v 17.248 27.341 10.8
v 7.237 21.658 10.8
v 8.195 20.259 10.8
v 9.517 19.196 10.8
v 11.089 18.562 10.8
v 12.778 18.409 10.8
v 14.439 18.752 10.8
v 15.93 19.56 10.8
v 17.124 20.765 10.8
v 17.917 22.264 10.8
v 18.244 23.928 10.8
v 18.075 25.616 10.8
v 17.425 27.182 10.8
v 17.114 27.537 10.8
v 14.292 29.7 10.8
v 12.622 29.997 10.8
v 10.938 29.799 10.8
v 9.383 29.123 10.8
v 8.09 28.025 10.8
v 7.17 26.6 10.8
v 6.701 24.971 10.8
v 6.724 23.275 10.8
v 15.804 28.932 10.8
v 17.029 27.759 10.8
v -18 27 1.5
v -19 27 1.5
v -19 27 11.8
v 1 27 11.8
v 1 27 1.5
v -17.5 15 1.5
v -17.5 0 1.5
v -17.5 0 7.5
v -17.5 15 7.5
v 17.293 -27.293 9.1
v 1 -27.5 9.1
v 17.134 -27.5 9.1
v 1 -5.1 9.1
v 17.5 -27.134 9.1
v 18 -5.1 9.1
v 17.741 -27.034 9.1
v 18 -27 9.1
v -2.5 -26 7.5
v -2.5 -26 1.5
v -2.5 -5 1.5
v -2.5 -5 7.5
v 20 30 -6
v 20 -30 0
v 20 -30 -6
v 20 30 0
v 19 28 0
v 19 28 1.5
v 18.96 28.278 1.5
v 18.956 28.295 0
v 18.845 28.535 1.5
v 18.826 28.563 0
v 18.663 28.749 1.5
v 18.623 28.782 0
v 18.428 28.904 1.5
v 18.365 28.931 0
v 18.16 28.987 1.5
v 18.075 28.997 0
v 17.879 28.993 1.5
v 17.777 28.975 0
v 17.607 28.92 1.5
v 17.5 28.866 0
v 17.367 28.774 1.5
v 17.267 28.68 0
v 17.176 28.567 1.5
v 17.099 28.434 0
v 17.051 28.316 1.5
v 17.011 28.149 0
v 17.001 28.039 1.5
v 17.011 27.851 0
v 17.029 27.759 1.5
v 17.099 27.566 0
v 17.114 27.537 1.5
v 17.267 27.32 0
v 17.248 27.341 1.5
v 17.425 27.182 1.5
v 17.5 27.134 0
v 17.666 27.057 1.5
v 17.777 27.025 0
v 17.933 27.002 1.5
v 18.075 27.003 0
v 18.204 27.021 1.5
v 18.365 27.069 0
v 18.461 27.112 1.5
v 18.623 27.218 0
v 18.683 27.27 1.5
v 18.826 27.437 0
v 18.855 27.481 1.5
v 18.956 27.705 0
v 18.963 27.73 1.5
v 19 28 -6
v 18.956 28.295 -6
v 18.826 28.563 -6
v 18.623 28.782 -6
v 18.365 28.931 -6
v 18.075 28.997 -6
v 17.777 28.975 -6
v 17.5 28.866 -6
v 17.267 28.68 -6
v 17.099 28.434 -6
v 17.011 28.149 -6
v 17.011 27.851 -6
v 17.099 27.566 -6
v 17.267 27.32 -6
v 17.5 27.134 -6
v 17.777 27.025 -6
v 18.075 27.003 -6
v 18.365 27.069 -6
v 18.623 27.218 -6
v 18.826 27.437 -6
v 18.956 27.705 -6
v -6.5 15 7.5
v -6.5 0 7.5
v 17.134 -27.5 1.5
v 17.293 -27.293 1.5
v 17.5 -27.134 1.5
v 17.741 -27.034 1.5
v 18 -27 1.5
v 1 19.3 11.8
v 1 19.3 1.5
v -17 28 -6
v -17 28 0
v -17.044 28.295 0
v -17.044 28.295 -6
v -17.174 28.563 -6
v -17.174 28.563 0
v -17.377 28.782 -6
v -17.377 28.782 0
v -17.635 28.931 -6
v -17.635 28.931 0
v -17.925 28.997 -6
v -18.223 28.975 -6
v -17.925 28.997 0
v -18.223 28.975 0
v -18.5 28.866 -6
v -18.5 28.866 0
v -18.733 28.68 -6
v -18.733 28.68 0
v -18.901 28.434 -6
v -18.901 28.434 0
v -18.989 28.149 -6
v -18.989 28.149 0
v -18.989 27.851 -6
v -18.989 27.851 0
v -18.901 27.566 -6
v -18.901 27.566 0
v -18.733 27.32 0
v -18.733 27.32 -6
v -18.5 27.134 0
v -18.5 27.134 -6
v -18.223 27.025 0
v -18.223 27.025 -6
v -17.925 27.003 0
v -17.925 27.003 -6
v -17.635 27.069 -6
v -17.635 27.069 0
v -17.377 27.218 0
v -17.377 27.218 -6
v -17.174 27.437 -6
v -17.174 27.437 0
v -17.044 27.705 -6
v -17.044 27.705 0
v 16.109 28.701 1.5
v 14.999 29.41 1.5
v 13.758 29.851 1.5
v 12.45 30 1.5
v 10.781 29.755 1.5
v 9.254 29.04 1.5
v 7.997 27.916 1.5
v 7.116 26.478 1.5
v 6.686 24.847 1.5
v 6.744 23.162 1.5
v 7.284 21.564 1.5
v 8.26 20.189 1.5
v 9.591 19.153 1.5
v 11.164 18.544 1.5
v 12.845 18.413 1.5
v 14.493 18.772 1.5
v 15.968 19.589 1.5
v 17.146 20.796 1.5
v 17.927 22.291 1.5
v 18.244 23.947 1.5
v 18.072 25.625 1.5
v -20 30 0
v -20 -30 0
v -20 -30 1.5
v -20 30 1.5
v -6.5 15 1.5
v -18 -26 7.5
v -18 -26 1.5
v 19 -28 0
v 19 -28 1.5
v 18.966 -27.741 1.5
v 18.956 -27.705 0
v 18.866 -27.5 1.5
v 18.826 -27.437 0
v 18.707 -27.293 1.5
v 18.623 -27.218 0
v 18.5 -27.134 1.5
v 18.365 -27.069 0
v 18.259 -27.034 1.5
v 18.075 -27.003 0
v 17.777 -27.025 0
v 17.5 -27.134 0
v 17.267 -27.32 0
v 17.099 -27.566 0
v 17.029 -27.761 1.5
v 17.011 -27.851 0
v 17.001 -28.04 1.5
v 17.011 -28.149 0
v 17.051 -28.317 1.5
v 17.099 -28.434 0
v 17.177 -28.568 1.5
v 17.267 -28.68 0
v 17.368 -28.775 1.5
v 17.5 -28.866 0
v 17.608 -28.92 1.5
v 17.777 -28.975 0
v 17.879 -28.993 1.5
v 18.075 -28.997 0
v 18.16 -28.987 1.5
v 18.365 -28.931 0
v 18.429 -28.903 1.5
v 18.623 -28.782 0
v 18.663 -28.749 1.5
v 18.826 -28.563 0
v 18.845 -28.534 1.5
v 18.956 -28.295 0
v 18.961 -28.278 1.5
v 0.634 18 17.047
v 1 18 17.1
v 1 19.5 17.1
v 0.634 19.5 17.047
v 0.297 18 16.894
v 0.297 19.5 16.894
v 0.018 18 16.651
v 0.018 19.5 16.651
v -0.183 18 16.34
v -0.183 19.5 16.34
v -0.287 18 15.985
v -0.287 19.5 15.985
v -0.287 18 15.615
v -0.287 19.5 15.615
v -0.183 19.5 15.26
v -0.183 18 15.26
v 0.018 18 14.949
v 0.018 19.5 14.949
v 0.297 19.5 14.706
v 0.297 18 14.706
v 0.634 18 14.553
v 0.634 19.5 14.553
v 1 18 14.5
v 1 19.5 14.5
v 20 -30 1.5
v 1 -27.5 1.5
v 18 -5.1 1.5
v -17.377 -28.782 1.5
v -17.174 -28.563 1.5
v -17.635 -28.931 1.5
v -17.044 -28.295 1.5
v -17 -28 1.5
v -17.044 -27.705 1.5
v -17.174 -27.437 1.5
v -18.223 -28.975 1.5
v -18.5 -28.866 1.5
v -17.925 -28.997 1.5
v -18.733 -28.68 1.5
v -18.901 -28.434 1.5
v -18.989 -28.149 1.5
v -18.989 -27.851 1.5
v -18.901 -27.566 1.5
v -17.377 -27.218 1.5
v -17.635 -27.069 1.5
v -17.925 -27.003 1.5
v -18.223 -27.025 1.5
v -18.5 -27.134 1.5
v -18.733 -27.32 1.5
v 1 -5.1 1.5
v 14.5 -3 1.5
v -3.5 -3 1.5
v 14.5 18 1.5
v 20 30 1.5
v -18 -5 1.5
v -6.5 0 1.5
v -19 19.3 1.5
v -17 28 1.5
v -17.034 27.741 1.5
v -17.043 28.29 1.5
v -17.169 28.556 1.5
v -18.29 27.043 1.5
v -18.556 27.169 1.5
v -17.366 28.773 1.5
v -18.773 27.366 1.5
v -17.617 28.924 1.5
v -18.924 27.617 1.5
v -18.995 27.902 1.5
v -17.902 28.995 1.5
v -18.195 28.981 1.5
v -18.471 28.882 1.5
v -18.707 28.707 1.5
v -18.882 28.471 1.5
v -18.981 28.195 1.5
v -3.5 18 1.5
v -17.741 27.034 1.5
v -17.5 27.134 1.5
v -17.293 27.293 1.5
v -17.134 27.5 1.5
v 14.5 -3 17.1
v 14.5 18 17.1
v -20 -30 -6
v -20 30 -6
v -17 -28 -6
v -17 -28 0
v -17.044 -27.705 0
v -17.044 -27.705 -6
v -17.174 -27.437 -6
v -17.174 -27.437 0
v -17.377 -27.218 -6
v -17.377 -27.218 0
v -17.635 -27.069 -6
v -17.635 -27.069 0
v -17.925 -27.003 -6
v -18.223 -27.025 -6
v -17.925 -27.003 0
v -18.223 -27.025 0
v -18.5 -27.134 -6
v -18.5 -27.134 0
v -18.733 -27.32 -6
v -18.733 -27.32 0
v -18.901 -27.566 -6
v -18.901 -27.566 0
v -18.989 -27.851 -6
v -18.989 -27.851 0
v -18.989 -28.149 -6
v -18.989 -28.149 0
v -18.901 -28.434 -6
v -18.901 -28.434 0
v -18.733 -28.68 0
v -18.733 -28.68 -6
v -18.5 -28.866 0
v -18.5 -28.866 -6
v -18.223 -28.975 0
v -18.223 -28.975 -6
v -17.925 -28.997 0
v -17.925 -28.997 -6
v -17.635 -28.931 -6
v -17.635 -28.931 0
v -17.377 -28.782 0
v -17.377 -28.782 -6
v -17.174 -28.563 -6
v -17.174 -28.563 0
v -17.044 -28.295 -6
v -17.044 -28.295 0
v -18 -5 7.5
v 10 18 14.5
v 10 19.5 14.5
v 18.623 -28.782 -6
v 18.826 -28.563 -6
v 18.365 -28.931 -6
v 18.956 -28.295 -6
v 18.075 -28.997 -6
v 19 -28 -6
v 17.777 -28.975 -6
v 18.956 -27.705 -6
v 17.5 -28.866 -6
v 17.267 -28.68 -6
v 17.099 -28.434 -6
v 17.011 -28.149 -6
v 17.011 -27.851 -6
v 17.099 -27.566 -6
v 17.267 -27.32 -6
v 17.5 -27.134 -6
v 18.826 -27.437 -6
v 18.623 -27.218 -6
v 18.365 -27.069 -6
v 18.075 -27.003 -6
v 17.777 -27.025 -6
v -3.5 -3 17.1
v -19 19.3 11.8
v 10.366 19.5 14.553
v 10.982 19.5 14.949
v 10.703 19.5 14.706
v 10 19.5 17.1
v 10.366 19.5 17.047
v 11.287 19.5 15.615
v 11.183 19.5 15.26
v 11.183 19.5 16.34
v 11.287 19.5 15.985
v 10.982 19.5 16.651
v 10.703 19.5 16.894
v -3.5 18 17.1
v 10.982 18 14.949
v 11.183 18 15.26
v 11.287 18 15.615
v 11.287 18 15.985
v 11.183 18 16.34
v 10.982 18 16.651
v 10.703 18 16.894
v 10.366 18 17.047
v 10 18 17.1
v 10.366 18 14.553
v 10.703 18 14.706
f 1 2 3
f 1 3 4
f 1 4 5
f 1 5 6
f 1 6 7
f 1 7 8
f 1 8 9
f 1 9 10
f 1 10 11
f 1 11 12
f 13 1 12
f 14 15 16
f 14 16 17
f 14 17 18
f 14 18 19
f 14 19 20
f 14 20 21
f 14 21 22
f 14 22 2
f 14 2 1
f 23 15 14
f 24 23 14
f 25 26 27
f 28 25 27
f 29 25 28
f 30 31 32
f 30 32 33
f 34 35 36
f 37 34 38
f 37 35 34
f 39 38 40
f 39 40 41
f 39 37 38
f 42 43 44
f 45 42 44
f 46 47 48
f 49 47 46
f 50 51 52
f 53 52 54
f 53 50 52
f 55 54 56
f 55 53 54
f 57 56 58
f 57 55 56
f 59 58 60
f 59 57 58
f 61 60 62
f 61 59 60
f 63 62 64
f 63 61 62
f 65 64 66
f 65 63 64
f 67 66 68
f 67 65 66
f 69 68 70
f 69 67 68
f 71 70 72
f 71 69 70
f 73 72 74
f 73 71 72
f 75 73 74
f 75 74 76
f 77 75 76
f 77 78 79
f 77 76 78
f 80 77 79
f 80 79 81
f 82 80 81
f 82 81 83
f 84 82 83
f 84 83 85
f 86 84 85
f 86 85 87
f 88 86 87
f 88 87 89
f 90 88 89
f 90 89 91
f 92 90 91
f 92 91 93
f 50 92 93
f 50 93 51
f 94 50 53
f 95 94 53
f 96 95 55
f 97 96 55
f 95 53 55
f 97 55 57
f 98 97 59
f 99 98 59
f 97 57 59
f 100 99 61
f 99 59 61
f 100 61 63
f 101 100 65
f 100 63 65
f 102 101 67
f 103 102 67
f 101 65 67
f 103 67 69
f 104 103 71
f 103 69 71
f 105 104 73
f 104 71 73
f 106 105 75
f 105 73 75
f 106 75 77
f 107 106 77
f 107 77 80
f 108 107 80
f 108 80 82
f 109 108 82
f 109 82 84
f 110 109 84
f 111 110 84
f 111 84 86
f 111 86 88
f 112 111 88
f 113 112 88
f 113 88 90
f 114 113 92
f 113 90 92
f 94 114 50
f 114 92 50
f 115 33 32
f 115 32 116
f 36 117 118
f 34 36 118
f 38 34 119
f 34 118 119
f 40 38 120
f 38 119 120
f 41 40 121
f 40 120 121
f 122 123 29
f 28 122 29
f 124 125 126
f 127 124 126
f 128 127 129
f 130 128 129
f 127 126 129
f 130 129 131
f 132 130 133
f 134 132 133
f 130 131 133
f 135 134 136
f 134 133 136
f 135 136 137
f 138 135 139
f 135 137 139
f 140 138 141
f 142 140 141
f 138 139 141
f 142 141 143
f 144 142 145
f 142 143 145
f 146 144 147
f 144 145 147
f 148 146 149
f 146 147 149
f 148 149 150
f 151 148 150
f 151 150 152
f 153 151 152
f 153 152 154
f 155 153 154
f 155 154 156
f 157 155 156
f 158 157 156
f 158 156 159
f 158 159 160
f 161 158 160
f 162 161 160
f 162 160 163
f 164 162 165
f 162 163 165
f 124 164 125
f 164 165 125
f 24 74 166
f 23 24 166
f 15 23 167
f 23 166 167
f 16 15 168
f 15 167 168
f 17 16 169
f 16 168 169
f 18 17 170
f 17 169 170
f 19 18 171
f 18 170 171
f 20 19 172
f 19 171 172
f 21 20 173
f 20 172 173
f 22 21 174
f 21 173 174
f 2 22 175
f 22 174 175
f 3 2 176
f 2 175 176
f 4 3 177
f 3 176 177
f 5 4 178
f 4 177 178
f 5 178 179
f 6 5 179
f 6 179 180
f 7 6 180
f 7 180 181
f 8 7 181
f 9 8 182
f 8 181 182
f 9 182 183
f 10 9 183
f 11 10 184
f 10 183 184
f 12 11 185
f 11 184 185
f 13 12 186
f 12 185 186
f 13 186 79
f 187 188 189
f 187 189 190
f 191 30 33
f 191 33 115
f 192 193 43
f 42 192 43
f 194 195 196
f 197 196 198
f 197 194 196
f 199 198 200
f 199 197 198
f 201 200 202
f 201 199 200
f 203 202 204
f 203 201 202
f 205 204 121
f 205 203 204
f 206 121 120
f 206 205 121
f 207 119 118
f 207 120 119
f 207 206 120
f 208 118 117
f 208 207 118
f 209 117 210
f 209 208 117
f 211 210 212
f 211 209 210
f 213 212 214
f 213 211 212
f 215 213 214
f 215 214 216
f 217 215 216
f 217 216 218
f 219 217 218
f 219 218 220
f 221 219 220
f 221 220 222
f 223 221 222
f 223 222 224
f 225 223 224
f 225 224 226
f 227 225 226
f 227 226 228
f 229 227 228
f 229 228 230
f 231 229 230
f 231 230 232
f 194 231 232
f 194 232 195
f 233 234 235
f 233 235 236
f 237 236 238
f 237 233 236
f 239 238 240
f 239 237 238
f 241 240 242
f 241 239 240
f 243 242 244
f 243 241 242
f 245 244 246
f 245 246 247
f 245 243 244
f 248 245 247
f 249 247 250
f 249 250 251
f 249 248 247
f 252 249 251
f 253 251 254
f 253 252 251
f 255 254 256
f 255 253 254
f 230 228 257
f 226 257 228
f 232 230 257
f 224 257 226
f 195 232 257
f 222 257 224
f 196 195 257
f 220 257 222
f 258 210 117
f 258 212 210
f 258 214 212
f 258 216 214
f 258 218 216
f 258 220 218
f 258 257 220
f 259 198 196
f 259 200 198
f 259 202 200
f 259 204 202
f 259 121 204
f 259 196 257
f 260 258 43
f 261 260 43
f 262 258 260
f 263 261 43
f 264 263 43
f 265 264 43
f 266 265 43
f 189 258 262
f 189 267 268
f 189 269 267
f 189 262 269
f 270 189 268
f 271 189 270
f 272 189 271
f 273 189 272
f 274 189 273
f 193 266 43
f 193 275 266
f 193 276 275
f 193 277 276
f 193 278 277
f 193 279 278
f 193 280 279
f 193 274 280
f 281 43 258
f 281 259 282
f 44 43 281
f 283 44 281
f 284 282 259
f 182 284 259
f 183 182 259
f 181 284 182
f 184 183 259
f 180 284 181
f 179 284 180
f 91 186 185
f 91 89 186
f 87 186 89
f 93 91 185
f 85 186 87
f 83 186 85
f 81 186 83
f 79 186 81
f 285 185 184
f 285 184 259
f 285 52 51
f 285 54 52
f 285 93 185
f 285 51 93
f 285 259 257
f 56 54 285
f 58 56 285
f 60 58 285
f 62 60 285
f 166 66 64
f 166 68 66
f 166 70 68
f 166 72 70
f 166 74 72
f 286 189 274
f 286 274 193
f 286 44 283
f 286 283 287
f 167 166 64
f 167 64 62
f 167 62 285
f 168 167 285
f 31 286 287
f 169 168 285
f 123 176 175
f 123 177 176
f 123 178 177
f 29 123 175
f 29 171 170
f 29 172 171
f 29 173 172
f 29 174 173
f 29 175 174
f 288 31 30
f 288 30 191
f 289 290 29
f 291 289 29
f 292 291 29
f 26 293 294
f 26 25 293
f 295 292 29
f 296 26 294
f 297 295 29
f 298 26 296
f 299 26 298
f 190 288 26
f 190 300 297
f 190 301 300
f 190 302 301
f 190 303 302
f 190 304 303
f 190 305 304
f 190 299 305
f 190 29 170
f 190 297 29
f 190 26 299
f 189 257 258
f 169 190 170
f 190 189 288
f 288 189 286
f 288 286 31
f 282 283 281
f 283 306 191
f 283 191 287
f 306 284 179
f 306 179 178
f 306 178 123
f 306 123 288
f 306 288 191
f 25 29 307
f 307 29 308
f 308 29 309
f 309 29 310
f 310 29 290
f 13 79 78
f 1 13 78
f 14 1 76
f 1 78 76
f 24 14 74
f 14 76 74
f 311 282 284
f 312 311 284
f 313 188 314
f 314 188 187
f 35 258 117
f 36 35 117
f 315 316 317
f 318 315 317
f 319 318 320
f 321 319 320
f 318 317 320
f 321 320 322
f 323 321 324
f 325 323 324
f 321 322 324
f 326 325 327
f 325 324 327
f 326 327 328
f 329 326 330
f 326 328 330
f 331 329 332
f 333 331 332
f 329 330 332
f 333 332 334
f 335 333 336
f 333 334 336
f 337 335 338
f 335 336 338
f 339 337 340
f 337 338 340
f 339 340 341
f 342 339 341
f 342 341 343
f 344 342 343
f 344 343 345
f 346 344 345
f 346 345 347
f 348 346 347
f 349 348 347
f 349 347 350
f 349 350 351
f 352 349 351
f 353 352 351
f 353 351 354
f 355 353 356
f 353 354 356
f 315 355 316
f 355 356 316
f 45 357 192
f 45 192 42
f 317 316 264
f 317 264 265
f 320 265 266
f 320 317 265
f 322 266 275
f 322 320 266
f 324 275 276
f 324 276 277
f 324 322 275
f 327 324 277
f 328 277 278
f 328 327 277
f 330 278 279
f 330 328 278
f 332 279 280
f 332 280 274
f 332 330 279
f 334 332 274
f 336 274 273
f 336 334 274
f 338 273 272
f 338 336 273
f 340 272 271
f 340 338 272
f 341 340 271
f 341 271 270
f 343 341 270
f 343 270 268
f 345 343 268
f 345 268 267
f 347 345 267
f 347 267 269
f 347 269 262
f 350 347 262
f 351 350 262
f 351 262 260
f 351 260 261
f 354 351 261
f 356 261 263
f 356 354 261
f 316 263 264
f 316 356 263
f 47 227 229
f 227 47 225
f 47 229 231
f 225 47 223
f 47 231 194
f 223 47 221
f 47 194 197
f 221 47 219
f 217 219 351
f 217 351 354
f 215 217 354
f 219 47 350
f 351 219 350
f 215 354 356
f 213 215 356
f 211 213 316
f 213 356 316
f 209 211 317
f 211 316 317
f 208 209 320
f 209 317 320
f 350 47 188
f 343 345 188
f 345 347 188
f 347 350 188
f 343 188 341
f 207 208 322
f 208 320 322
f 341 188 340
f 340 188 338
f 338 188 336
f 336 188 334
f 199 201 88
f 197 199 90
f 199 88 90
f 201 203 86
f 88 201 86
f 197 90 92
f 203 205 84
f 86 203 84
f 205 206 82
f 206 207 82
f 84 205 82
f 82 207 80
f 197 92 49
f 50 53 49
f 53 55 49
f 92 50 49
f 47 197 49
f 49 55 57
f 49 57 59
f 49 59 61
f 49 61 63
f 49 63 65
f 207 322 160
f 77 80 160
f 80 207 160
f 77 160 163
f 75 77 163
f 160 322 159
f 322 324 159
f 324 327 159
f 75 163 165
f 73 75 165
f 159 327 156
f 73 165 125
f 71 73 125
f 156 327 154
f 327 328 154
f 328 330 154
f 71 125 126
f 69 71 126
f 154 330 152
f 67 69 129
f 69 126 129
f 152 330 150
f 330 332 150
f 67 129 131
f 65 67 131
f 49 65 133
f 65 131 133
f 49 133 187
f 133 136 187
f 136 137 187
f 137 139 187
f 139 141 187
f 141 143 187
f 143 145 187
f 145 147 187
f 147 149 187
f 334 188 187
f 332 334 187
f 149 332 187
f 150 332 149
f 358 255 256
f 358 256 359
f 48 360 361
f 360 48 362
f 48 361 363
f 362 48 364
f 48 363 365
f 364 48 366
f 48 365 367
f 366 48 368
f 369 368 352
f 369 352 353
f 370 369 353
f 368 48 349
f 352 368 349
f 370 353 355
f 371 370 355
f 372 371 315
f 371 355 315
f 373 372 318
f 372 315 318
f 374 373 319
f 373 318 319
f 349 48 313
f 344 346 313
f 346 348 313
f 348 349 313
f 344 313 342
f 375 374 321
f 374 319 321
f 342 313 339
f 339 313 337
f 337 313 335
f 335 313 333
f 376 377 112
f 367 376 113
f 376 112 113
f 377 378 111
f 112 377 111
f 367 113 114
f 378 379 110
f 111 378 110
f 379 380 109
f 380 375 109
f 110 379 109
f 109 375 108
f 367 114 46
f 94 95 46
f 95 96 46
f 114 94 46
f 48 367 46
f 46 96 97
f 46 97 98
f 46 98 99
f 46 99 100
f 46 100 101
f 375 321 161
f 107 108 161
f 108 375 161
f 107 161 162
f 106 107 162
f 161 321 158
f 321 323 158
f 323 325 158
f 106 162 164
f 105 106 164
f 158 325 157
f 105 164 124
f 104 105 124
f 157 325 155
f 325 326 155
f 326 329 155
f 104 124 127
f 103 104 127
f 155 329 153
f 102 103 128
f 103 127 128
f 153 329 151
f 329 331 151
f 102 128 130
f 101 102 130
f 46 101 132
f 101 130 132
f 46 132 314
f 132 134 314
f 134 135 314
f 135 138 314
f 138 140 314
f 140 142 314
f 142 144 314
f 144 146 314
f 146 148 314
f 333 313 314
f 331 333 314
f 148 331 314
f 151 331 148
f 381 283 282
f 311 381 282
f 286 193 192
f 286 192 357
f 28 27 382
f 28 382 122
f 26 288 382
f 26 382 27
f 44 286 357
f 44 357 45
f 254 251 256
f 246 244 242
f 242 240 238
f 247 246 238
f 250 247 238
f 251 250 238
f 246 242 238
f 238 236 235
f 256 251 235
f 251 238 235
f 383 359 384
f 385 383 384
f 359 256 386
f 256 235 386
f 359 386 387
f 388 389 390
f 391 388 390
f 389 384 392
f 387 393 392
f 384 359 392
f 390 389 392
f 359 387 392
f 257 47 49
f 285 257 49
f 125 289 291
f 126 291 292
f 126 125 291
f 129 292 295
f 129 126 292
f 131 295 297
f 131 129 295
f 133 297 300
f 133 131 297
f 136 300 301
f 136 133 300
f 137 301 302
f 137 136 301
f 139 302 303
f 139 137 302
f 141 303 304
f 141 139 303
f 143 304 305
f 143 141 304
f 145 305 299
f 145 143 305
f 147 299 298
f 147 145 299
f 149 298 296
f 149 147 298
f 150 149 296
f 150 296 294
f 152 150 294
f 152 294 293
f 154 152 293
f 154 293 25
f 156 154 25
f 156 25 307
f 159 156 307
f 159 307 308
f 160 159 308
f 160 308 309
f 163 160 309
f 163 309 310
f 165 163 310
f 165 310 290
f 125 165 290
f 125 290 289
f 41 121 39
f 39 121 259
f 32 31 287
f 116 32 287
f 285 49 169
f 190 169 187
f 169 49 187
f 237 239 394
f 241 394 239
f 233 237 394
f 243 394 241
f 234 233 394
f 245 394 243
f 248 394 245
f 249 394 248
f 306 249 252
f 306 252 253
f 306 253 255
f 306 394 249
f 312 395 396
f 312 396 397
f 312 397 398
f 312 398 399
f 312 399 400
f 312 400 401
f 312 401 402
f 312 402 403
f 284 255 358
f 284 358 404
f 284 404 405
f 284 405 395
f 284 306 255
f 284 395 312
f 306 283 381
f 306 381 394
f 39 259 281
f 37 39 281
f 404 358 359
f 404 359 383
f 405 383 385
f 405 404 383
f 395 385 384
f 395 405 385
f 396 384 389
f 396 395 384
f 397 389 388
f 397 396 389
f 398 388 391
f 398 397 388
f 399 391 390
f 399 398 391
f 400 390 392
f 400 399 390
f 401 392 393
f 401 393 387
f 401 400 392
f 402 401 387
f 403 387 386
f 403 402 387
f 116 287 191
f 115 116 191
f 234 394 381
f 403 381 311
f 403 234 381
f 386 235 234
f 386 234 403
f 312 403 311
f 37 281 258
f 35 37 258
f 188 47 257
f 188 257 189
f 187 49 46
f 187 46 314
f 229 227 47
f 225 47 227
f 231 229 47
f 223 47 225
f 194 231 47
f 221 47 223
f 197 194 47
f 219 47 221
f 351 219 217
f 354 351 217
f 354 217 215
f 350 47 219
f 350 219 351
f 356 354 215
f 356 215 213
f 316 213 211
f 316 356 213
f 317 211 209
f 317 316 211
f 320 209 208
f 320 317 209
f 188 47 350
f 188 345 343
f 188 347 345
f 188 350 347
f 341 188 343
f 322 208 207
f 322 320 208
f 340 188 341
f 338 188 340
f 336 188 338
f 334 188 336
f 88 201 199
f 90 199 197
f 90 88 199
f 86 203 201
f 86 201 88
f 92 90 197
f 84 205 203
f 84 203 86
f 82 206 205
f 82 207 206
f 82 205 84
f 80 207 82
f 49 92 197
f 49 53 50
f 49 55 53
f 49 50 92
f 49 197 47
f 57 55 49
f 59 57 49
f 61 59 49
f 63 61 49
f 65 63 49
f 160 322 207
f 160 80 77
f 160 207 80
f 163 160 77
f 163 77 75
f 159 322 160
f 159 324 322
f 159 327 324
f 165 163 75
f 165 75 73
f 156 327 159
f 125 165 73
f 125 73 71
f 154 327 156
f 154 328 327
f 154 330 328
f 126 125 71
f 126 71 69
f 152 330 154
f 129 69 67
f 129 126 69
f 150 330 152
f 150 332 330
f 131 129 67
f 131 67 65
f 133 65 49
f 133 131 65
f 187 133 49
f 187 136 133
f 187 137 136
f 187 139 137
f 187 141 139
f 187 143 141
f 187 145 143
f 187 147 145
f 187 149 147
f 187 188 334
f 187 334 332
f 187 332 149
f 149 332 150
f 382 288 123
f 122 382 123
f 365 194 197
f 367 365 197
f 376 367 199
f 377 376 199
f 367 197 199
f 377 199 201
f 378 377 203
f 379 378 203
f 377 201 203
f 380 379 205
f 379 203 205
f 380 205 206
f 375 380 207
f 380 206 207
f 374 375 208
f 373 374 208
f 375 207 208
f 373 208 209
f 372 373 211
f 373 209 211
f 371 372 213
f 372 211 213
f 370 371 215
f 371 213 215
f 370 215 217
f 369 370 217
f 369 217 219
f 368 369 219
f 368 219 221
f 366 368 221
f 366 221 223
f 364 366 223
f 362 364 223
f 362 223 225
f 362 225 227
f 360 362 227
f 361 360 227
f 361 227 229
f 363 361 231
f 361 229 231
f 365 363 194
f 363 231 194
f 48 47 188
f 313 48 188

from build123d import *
from build123d.topology import SkipClean

# Parameters (mm, degrees)
SKETCH1_W           = 60
SKETCH1_H           = 40
SKETCH1_R           = 1
BOSS_EXTRUDE1_DEPTH = 1.5
SKETCH2_W           = 15.5
SKETCH2_H           = 21
SKETCH2_W_2         = 11
SKETCH2_H_2         = 15
BOSS_EXTRUDE2_DEPTH = 6
BOSS_EXTRUDE3_DEPTH = 7.6
SKETCH2_4_W         = 18
SKETCH2_4_H         = 21
BOSS_EXTRUDE4_DEPTH = 15.6
BOSS_EXTRUDE5_DEPTH = 9.3
SKETCH2_6_W         = 20
SKETCH2_6_H         = 7.7
BOSS_EXTRUDE6_DEPTH = 10.3
SKETCH1_3_W         = 60
SKETCH1_3_H         = 40
SKETCH1_3_R         = 1
BOSS_EXTRUDE7_DEPTH = 6
BOSS_EXTRUDE8_DEPTH = 1.5


with BuildPart() as part:
    # Sketch1 → Boss-Extrude1 (new body)
    with BuildSketch(Plane(origin=(0, 0, 0), x_dir=(0, 1, 0), z_dir=(0, 0, 1))):
        Rectangle(SKETCH1_W, SKETCH1_H)
        with Locations((28, 18)):
            Circle(SKETCH1_R, mode=Mode.SUBTRACT)
        with Locations((-28, 18)):
            Circle(SKETCH1_R, mode=Mode.SUBTRACT)
        with Locations((-28, -18)):
            Circle(SKETCH1_R, mode=Mode.SUBTRACT)
        with Locations((28, -18)):
            Circle(SKETCH1_R, mode=Mode.SUBTRACT)
    extrude(amount=BOSS_EXTRUDE1_DEPTH)

    # Sketch2 → Boss-Extrude2 (add)
    with BuildSketch(Plane.XY.offset(1.5)):
        with Locations((-10.25, -15.5)):
            Rectangle(SKETCH2_W, SKETCH2_H)
        with Locations((-12, 7.5)):
            Rectangle(SKETCH2_W_2, SKETCH2_H_2)
    extrude(amount=BOSS_EXTRUDE2_DEPTH)

    # Sketch2<3> → Boss-Extrude3 (add)
    with SkipClean():  # the faces are left unmerged after this step: merging them gives an invalid solid
        with BuildSketch(Plane.XY.offset(1.5)):
            with BuildLine():
                Line((1, -5.1), (1, -27.5))
                Line((1, -27.5), (17.133974596, -27.5))
                ThreePointArc((17.133974596, -27.5), (17.5, -27.133974596), (18, -27))
                Line((18, -27), (18, -5.1))
                Line((18, -5.1), (1, -5.1))
            make_face()
        extrude(amount=BOSS_EXTRUDE3_DEPTH)

    # Sketch2<4> → Boss-Extrude4 (add)
    with SkipClean():  # the faces are left unmerged after this step: merging them gives an invalid solid
        with BuildSketch(Plane.XY.offset(1.5)):
            with Locations((5.5, 7.5)):
                Rectangle(SKETCH2_4_W, SKETCH2_4_H)
        extrude(amount=BOSS_EXTRUDE4_DEPTH)

    # Sketch2<5> → Boss-Extrude5 (add)
    with SkipClean():  # the faces are left unmerged after this step: merging them gives an invalid solid
        with BuildSketch(Plane.XY.offset(1.5)):
            with BuildLine():
                ThreePointArc((17.029376138, 27.759398009), (6.963635922, 22.318561933), (18.25, 24.2))
                ThreePointArc((18.25, 24.2), (18.039854669, 25.747102058), (17.424646629, 27.182095056))
                ThreePointArc((17.424646629, 27.182095056), (17.174875114, 27.435049628), (17.029376138, 27.759398009))
            make_face()
        extrude(amount=BOSS_EXTRUDE5_DEPTH)

    # Sketch2<6> → Boss-Extrude6 (add)
    with SkipClean():  # the faces are left unmerged after this step: merging them gives an invalid solid
        with BuildSketch(Plane.XY.offset(1.5)):
            with Locations((-9, 23.15)):
                Rectangle(SKETCH2_6_W, SKETCH2_6_H)
        extrude(amount=BOSS_EXTRUDE6_DEPTH)

    # Sketch4 → Boss-Extrude8 (add)
    with SkipClean():  # the faces are left unmerged after this step: merging them gives an invalid solid
        with BuildSketch(Plane(origin=(0, 18, 0), x_dir=(-1, 0, 0), z_dir=(0, 1, 0))):
            with BuildLine():
                Line((-10, 17.1), (-1, 17.1))
                ThreePointArc((-1, 17.1), (0.3, 15.8), (-1, 14.5))
                Line((-1, 14.5), (-10, 14.5))
                ThreePointArc((-10, 14.5), (-11.3, 15.8), (-10, 17.1))
            make_face()
        extrude(amount=BOSS_EXTRUDE8_DEPTH)


with BuildPart() as body_2:
    # Sketch1<3> → Boss-Extrude7 (new body)
    with BuildSketch(Plane(origin=(0, 0, 0), x_dir=(0, 1, 0), z_dir=(0, 0, 1))):
        Rectangle(SKETCH1_3_W, SKETCH1_3_H)
        with Locations((28, 18)):
            Circle(SKETCH1_3_R, mode=Mode.SUBTRACT)
        with Locations((-28, 18)):
            Circle(SKETCH1_3_R, mode=Mode.SUBTRACT)
        with Locations((-28, -18)):
            Circle(SKETCH1_3_R, mode=Mode.SUBTRACT)
        with Locations((28, -18)):
            Circle(SKETCH1_3_R, mode=Mode.SUBTRACT)
    extrude(amount=-BOSS_EXTRUDE7_DEPTH)


solid = Compound([part.part, body_2.part])
